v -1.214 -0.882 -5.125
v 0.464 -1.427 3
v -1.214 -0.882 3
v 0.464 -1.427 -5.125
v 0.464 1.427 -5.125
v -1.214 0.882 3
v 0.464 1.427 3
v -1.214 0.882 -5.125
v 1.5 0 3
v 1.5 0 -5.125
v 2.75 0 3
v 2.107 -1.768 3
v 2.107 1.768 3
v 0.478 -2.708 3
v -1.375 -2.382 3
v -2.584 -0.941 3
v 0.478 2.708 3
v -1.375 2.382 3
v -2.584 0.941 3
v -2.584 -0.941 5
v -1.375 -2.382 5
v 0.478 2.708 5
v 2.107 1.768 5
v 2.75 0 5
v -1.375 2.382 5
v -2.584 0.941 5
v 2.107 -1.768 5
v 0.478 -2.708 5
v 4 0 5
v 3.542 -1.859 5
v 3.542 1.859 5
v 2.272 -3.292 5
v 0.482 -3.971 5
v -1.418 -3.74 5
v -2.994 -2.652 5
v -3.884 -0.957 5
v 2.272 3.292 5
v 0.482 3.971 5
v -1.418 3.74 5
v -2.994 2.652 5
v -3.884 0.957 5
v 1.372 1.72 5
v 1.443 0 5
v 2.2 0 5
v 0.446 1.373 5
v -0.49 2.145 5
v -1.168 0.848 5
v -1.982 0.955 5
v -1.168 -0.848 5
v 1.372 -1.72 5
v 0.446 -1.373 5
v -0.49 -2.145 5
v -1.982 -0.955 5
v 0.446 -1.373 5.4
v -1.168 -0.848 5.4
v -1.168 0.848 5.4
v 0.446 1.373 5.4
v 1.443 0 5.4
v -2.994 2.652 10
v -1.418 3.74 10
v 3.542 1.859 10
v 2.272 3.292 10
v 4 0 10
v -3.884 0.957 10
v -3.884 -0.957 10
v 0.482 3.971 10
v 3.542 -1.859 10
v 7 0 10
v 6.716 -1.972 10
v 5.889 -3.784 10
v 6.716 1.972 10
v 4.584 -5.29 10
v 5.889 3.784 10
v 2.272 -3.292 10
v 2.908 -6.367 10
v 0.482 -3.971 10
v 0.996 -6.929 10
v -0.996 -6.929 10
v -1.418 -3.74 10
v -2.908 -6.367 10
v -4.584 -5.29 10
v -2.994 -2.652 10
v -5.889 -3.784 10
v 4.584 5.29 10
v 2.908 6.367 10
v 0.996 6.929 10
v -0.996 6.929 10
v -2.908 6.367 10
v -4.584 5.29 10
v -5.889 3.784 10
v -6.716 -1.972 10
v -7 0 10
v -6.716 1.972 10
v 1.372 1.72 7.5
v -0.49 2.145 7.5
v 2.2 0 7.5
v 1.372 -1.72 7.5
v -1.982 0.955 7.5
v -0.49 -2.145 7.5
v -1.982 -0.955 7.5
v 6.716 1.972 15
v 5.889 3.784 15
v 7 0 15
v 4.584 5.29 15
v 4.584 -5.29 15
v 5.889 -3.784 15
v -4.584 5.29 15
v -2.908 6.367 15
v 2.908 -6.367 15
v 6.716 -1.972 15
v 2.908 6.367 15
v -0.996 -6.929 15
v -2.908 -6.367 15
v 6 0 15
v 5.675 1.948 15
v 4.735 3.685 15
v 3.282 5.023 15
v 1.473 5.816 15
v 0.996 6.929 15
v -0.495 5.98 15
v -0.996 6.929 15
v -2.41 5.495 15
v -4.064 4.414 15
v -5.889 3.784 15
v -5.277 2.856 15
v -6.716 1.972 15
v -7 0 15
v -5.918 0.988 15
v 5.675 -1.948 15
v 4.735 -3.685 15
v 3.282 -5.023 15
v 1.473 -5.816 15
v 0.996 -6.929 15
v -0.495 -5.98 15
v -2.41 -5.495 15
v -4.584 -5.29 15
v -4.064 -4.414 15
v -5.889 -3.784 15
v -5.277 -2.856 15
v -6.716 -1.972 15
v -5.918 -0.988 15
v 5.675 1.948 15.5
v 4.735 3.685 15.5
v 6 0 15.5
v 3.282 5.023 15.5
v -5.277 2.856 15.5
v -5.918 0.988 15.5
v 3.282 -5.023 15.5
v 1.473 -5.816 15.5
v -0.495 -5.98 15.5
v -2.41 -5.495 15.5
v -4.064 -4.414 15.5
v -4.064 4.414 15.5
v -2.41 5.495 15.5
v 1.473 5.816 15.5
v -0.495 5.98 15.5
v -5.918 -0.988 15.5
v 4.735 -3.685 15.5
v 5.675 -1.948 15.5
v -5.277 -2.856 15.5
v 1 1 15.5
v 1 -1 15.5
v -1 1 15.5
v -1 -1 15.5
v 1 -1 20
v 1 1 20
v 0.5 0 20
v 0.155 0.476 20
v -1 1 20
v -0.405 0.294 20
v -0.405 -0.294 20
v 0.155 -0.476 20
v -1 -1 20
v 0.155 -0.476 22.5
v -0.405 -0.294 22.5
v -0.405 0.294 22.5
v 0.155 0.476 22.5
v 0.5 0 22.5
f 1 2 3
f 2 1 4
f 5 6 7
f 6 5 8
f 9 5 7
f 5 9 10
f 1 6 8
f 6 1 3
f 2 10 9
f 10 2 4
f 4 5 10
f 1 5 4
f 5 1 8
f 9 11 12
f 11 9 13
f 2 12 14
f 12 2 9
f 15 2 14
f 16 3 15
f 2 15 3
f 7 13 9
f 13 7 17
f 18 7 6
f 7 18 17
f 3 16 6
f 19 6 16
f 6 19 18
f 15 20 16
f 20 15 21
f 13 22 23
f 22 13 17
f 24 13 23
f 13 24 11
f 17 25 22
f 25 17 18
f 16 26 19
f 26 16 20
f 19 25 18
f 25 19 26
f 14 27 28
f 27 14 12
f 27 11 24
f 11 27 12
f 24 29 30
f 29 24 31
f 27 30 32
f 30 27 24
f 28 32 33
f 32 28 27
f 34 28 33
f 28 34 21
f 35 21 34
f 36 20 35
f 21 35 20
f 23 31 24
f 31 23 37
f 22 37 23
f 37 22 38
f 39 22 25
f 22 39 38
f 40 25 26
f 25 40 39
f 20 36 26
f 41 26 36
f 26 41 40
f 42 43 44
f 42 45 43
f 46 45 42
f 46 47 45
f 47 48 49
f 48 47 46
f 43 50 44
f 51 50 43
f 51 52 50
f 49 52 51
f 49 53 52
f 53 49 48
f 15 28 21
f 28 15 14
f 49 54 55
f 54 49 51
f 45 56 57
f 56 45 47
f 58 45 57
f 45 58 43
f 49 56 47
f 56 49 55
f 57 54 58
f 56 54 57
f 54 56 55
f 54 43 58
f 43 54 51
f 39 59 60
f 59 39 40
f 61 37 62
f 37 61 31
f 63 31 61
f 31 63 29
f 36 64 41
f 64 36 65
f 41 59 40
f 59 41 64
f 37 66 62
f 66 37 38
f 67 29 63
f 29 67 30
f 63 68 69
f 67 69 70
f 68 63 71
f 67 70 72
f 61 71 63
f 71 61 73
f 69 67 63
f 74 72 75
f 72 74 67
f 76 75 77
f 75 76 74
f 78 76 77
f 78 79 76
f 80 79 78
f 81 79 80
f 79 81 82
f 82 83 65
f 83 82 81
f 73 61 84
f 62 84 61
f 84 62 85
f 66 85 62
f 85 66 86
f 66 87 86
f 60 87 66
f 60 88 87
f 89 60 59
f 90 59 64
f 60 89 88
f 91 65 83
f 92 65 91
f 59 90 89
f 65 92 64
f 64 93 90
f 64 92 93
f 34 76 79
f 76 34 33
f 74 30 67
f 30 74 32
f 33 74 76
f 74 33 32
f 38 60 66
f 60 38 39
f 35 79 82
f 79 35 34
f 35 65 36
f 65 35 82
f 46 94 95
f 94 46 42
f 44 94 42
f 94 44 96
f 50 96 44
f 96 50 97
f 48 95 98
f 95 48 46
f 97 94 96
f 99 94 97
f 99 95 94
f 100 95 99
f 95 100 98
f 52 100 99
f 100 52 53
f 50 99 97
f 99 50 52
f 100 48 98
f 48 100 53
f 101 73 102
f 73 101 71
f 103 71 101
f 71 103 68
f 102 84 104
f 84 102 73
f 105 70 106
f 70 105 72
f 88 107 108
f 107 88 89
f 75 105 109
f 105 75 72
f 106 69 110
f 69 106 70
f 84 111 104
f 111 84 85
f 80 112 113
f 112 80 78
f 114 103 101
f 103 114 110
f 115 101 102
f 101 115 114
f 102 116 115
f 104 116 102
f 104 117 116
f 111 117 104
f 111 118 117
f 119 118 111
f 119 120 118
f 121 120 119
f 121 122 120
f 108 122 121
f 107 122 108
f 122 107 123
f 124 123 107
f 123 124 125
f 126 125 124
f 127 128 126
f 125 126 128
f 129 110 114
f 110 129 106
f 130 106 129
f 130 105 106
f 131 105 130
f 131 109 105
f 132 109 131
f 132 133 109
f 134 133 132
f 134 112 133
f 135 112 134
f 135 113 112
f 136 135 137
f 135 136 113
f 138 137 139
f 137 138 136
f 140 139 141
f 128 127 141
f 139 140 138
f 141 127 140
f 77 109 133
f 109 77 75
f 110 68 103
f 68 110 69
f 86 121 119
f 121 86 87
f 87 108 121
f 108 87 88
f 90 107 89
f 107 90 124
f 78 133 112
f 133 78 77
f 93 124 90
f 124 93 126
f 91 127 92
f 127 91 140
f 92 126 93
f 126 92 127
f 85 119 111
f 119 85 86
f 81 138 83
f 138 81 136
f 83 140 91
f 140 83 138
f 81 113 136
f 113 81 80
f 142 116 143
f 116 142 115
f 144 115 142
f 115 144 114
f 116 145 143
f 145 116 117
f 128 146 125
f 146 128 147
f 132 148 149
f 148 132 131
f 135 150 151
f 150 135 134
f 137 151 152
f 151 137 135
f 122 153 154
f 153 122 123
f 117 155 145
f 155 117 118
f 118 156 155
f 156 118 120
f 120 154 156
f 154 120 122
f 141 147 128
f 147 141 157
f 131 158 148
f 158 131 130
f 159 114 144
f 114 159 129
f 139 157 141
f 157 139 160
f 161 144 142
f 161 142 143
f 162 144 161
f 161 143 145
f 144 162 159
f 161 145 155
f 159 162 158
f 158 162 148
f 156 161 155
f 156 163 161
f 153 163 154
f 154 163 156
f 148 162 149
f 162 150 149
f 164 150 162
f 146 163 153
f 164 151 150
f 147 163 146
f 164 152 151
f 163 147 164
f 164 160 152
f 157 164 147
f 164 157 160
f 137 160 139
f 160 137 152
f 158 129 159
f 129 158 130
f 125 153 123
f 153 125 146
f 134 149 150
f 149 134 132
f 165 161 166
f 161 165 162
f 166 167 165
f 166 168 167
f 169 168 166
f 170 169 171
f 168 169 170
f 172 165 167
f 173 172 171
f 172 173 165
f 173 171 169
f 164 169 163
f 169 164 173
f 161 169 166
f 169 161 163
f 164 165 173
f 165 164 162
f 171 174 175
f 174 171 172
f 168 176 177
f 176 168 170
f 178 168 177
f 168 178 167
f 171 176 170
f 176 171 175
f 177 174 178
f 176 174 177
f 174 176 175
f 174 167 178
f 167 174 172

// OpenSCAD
// Parameters
shaft_diameter_mm = 3; //[1.5:6:0.1]
length_mm = 10; //[5:20:0.5]
head_diameter_mm = 5.5; //[3:11:0.1]
head_height_mm = 2; //[1:4:0.1]
socket_af_mm = 2.5; //[1.5:4:0.1]
socket_depth_mm = 1.4; //[0.8:2.2:0.1]
thread_major_diameter_mm = 3; //[1.5:6:0.1]
thread_minor_diameter_mm = 2.6; //[1.2:5.2:0.1]
thread_pitch_mm = 0.5; //[0.25:1:0.05]
thread_turns = 12; //[4:40:1]
thread_ring_thickness_mm = 0.25; //[0.1:0.6:0.05]
overlap_mm = 0.8; //[0.5:2:0.1]

// Screw and Washer - complete geometry
module screw_and_washer() {
  color("DimGray") {
    // Screw Shaft
    translate([0, 0, -head_height_mm/2])
      cylinder(h=length_mm - head_height_mm, r=shaft_diameter_mm/2, center=true);
    
    // Cap Head
    translate([0, 0, (length_mm - head_height_mm)/2])
      cylinder(h=head_height_mm, r=head_diameter_mm/2, center=true);
    
    // Hex Socket
    translate([0, 0, (length_mm - head_height_mm)/2 + head_height_mm/2 - socket_depth_mm/2 + overlap_mm/2])
      rotate([0, 0, 0])
      cylinder(h=socket_depth_mm, r=(socket_af_mm/2)/cos(30), center=true);
    
    // Cosmetic Thread Rings
    for (i = [0:thread_turns-1]) {
      translate([0, 0, -head_height_mm/2 - (length_mm - head_height_mm)/2 + thread_pitch_mm*i])
        cylinder(h=thread_ring_thickness_mm, r=thread_major_diameter_mm/2, center=true);
    }
  }
}

// PCB Spacer - complete geometry
module pcb_spacer() {
  color("Silver") {
    // Spacer Body
    difference() {
      cylinder(h=5, r=4, center=true);
      translate([0, 0, -2.5]) cylinder(h=5, r=2.2, center=true);
    }
  }
}

// Buzzer - complete geometry
module buzzer() {
  color("Black") {
    // Buzzer Body
    cylinder(h=5, r=7, center=true);
    // Buzzer Top
    translate([0, 0, 2.5]) cylinder(h=1, r=6, center=true);
  }
}

// Pin Socket - complete geometry
module pin_socket() {
  color("Gold") {
    // Pin Socket Body
    cube([2, 2, 5], center=true);
    // Pin
    translate([0, 0, 2.5]) cylinder(h=5, r=0.5, center=true);
  }
}

// Assembly
module assembly() {
  translate([0, 0, 0]) screw_and_washer();
  translate([0, 0, length_mm/2 + 2.5]) pcb_spacer();
  translate([0, 0, length_mm/2 + 7.5]) buzzer();
  translate([0, 0, length_mm/2 + 12.5]) pin_socket();
}

assembly();
